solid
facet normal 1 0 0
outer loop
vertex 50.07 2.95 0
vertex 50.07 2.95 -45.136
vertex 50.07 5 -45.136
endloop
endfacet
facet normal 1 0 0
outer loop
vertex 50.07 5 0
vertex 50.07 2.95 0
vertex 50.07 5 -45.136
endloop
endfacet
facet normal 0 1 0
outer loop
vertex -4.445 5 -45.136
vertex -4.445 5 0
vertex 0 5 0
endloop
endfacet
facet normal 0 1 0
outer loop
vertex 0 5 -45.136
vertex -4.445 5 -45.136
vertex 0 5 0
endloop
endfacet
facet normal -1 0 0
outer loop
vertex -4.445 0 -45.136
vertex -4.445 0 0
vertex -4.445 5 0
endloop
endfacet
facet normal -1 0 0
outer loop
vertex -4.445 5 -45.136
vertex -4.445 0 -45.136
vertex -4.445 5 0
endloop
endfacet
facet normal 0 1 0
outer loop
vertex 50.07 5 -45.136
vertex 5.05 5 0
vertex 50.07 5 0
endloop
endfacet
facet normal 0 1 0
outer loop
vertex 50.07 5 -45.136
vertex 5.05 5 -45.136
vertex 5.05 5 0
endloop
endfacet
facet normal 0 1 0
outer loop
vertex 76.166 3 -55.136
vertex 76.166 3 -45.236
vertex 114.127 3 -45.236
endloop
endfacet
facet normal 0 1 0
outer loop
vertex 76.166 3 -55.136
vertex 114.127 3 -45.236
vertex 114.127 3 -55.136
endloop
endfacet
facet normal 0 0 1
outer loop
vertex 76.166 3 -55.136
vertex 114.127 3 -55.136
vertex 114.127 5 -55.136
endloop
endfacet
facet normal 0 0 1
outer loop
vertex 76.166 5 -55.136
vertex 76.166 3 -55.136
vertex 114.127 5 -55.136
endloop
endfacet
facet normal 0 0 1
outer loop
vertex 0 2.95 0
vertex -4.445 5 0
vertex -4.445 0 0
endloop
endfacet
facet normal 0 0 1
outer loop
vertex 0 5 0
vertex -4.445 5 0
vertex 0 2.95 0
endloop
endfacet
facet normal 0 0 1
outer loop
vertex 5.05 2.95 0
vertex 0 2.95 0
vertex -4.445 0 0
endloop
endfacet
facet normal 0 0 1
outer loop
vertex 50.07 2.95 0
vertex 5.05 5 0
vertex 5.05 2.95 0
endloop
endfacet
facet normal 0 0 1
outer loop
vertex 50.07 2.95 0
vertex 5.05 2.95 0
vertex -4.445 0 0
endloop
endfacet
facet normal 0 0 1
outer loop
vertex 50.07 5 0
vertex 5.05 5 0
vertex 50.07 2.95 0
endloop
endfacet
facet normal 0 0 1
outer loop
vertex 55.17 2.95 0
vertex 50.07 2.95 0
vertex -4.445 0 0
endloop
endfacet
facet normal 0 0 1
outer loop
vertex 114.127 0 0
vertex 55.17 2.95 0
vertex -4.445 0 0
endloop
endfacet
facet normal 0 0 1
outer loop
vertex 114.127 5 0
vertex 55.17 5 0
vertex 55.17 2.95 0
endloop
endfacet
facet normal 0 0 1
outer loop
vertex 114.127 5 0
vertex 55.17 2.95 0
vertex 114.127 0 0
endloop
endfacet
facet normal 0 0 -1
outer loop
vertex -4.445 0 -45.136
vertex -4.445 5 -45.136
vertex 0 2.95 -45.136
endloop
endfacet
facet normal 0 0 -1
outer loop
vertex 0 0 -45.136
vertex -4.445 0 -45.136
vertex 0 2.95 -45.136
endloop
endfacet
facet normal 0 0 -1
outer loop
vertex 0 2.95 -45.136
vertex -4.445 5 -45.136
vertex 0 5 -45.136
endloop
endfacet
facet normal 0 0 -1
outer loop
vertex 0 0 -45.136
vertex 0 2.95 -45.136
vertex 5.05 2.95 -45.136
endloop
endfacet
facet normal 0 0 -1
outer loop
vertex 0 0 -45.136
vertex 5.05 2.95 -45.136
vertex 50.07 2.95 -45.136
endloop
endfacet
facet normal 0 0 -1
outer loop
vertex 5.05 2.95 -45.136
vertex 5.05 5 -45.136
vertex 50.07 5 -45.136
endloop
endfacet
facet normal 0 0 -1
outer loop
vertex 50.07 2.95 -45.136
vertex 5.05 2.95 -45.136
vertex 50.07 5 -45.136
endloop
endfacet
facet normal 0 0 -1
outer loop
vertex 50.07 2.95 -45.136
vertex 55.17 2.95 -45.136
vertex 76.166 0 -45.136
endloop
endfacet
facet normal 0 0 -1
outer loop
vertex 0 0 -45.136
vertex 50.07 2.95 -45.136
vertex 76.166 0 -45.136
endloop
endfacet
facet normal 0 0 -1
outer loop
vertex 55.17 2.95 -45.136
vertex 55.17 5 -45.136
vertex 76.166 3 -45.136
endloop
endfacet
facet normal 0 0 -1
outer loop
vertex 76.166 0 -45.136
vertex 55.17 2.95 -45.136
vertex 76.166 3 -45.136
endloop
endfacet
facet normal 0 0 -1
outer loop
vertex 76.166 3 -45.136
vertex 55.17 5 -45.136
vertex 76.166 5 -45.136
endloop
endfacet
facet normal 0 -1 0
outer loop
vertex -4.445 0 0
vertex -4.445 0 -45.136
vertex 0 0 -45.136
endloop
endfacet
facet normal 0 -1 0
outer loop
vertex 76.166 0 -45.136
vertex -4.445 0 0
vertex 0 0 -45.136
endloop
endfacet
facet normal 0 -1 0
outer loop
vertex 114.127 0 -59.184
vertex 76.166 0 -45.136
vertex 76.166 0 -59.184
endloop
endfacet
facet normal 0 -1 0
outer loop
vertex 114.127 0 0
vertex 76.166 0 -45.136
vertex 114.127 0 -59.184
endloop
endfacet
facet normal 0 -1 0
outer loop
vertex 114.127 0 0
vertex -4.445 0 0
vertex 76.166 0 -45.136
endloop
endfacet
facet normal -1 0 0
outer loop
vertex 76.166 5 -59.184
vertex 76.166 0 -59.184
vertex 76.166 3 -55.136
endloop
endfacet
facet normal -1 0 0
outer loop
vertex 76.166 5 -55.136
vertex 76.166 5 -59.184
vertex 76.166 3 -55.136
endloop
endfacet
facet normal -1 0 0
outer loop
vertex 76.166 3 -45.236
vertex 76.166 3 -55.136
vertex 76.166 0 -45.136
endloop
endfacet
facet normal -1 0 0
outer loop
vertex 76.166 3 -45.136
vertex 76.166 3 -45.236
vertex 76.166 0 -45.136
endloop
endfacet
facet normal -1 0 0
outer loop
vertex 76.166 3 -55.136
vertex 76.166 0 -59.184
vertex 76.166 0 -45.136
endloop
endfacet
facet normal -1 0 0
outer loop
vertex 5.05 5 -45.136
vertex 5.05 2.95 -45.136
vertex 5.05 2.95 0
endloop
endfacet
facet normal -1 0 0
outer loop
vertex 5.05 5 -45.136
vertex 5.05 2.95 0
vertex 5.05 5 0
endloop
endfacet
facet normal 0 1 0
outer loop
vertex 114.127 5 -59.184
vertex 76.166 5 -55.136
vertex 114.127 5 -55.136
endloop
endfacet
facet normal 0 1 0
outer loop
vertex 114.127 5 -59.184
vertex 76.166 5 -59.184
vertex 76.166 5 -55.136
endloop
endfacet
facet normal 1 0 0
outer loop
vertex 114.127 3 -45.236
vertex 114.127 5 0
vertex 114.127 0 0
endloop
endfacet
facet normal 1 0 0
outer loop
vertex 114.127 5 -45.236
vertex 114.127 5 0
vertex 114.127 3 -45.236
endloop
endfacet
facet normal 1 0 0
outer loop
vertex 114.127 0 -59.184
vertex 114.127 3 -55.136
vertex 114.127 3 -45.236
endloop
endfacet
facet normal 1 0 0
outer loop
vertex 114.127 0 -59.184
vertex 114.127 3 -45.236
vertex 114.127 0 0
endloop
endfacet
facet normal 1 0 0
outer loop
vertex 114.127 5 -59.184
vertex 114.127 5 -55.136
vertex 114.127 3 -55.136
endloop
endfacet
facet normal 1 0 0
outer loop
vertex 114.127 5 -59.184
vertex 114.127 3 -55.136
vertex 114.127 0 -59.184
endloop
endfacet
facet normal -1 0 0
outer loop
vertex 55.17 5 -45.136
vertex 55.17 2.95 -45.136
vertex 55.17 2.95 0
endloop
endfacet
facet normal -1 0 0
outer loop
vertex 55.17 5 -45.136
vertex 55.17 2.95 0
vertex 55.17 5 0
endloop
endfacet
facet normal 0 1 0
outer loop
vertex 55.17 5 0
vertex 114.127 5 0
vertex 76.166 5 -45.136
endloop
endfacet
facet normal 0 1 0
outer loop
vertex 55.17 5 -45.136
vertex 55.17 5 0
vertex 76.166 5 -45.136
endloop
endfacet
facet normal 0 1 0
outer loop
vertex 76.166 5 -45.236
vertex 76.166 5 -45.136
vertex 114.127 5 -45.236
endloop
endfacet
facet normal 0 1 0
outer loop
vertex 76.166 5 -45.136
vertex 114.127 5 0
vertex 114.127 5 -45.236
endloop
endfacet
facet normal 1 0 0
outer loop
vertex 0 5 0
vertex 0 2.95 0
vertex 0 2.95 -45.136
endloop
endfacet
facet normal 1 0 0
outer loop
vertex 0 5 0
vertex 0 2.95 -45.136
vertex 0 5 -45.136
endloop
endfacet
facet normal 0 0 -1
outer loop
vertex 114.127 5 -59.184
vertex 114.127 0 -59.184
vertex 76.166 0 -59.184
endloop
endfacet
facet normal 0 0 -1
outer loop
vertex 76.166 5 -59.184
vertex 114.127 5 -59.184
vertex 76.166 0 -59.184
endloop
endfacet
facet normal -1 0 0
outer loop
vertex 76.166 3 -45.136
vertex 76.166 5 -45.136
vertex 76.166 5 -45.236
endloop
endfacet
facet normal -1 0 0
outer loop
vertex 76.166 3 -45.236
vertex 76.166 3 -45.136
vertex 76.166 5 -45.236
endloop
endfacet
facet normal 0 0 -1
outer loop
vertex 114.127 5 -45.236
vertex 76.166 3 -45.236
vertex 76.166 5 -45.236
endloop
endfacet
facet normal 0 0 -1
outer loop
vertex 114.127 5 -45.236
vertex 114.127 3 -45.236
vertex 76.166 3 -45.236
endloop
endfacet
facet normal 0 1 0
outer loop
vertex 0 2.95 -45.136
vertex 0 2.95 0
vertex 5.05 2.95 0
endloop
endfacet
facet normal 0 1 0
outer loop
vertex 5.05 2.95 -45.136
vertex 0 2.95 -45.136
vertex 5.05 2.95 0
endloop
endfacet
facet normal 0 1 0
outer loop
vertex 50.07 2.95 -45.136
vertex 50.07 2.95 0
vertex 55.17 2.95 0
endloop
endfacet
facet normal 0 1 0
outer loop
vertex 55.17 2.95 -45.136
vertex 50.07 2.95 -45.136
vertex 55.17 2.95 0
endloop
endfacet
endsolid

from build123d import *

# Parameters (mm, degrees)
BOSS_EXTRUDE1_DEPTH     = 5
SKETCH2_W               = 5.1
SKETCH2_H               = 2.05
CUT_EXTRUDE1_DEPTH      = 1
CUT_EXTRUDE1_DEPTH_BACK = 60.1838596
CUT_EXTRUDE2_REACH      = 116.127
SKETCH3_W               = 10
SKETCH3_H               = 2
SKETCH4_W               = 4.444636185
SKETCH4_H               = 5
BOSS_EXTRUDE2_DEPTH     = 45.135921
SKETCH5_W               = 0.1
SKETCH5_H               = 2
BOSS_EXTRUDE3_DEPTH     = 37.960973


with BuildPart() as part:
    # Sketch1 → Boss-Extrude1 (new body)
    with BuildSketch(Plane(origin=(0, 0, 0), x_dir=(1, 0, 0), z_dir=(0, 1, 0))):
        Polygon((0, 0), (114.126652136, 0), (114.126652136, 45.135921053), (114.126652136, 59.1838596), (76.165679632, 59.1838596), (76.165679632, 45.135921053), (0, 45.135921053), align=None)
    extrude(amount=BOSS_EXTRUDE1_DEPTH)

    # Sketch2 → Cut-Extrude1 (cut, two sides)
    with BuildSketch(Plane.XY) as cut_extrude1_sk:
        with Locations((2.5, 3.975)):
            Rectangle(SKETCH2_W, SKETCH2_H)
        with Locations((52.62, 3.975)):
            Rectangle(SKETCH2_W, SKETCH2_H)
    extrude(amount=CUT_EXTRUDE1_DEPTH, mode=Mode.SUBTRACT)
    extrude(cut_extrude1_sk.sketch, amount=-CUT_EXTRUDE1_DEPTH_BACK, mode=Mode.SUBTRACT)

    # Sketch3 → Cut-Extrude2 (cut, up to next)
    with BuildSketch(Plane(origin=(114.126652136, -2e-09, 0), x_dir=(0, 0, -1), z_dir=(1, 0, 0)), mode=Mode.PRIVATE) as cut_extrude2_sk1:
        with Locations((50.135921053, 4.000000002)):
            Rectangle(SKETCH3_W, SKETCH3_H)
    cut_extrude2_tool1 = extrude(cut_extrude2_sk1.sketch, amount=-CUT_EXTRUDE2_REACH, mode=Mode.PRIVATE) & part.part
    add(cut_extrude2_tool1.solids().sort_by_distance((114.126652, 4, -50.135921))[0], mode=Mode.SUBTRACT)

    # Sketch4 → Boss-Extrude2 (add)
    with BuildSketch(Plane.XY):
        with Locations((-2.222318093, 2.5)):
            Rectangle(SKETCH4_W, SKETCH4_H)
    extrude(amount=-BOSS_EXTRUDE2_DEPTH)

    # Sketch5 → Boss-Extrude3 (add)
    with BuildSketch(Plane(origin=(114.126652136, 0, 0), x_dir=(0, 0, -1), z_dir=(1, 0, 0))):
        with Locations((45.185921053, 4)):
            Rectangle(SKETCH5_W, SKETCH5_H)
    extrude(amount=-BOSS_EXTRUDE3_DEPTH)


solid = part.part
